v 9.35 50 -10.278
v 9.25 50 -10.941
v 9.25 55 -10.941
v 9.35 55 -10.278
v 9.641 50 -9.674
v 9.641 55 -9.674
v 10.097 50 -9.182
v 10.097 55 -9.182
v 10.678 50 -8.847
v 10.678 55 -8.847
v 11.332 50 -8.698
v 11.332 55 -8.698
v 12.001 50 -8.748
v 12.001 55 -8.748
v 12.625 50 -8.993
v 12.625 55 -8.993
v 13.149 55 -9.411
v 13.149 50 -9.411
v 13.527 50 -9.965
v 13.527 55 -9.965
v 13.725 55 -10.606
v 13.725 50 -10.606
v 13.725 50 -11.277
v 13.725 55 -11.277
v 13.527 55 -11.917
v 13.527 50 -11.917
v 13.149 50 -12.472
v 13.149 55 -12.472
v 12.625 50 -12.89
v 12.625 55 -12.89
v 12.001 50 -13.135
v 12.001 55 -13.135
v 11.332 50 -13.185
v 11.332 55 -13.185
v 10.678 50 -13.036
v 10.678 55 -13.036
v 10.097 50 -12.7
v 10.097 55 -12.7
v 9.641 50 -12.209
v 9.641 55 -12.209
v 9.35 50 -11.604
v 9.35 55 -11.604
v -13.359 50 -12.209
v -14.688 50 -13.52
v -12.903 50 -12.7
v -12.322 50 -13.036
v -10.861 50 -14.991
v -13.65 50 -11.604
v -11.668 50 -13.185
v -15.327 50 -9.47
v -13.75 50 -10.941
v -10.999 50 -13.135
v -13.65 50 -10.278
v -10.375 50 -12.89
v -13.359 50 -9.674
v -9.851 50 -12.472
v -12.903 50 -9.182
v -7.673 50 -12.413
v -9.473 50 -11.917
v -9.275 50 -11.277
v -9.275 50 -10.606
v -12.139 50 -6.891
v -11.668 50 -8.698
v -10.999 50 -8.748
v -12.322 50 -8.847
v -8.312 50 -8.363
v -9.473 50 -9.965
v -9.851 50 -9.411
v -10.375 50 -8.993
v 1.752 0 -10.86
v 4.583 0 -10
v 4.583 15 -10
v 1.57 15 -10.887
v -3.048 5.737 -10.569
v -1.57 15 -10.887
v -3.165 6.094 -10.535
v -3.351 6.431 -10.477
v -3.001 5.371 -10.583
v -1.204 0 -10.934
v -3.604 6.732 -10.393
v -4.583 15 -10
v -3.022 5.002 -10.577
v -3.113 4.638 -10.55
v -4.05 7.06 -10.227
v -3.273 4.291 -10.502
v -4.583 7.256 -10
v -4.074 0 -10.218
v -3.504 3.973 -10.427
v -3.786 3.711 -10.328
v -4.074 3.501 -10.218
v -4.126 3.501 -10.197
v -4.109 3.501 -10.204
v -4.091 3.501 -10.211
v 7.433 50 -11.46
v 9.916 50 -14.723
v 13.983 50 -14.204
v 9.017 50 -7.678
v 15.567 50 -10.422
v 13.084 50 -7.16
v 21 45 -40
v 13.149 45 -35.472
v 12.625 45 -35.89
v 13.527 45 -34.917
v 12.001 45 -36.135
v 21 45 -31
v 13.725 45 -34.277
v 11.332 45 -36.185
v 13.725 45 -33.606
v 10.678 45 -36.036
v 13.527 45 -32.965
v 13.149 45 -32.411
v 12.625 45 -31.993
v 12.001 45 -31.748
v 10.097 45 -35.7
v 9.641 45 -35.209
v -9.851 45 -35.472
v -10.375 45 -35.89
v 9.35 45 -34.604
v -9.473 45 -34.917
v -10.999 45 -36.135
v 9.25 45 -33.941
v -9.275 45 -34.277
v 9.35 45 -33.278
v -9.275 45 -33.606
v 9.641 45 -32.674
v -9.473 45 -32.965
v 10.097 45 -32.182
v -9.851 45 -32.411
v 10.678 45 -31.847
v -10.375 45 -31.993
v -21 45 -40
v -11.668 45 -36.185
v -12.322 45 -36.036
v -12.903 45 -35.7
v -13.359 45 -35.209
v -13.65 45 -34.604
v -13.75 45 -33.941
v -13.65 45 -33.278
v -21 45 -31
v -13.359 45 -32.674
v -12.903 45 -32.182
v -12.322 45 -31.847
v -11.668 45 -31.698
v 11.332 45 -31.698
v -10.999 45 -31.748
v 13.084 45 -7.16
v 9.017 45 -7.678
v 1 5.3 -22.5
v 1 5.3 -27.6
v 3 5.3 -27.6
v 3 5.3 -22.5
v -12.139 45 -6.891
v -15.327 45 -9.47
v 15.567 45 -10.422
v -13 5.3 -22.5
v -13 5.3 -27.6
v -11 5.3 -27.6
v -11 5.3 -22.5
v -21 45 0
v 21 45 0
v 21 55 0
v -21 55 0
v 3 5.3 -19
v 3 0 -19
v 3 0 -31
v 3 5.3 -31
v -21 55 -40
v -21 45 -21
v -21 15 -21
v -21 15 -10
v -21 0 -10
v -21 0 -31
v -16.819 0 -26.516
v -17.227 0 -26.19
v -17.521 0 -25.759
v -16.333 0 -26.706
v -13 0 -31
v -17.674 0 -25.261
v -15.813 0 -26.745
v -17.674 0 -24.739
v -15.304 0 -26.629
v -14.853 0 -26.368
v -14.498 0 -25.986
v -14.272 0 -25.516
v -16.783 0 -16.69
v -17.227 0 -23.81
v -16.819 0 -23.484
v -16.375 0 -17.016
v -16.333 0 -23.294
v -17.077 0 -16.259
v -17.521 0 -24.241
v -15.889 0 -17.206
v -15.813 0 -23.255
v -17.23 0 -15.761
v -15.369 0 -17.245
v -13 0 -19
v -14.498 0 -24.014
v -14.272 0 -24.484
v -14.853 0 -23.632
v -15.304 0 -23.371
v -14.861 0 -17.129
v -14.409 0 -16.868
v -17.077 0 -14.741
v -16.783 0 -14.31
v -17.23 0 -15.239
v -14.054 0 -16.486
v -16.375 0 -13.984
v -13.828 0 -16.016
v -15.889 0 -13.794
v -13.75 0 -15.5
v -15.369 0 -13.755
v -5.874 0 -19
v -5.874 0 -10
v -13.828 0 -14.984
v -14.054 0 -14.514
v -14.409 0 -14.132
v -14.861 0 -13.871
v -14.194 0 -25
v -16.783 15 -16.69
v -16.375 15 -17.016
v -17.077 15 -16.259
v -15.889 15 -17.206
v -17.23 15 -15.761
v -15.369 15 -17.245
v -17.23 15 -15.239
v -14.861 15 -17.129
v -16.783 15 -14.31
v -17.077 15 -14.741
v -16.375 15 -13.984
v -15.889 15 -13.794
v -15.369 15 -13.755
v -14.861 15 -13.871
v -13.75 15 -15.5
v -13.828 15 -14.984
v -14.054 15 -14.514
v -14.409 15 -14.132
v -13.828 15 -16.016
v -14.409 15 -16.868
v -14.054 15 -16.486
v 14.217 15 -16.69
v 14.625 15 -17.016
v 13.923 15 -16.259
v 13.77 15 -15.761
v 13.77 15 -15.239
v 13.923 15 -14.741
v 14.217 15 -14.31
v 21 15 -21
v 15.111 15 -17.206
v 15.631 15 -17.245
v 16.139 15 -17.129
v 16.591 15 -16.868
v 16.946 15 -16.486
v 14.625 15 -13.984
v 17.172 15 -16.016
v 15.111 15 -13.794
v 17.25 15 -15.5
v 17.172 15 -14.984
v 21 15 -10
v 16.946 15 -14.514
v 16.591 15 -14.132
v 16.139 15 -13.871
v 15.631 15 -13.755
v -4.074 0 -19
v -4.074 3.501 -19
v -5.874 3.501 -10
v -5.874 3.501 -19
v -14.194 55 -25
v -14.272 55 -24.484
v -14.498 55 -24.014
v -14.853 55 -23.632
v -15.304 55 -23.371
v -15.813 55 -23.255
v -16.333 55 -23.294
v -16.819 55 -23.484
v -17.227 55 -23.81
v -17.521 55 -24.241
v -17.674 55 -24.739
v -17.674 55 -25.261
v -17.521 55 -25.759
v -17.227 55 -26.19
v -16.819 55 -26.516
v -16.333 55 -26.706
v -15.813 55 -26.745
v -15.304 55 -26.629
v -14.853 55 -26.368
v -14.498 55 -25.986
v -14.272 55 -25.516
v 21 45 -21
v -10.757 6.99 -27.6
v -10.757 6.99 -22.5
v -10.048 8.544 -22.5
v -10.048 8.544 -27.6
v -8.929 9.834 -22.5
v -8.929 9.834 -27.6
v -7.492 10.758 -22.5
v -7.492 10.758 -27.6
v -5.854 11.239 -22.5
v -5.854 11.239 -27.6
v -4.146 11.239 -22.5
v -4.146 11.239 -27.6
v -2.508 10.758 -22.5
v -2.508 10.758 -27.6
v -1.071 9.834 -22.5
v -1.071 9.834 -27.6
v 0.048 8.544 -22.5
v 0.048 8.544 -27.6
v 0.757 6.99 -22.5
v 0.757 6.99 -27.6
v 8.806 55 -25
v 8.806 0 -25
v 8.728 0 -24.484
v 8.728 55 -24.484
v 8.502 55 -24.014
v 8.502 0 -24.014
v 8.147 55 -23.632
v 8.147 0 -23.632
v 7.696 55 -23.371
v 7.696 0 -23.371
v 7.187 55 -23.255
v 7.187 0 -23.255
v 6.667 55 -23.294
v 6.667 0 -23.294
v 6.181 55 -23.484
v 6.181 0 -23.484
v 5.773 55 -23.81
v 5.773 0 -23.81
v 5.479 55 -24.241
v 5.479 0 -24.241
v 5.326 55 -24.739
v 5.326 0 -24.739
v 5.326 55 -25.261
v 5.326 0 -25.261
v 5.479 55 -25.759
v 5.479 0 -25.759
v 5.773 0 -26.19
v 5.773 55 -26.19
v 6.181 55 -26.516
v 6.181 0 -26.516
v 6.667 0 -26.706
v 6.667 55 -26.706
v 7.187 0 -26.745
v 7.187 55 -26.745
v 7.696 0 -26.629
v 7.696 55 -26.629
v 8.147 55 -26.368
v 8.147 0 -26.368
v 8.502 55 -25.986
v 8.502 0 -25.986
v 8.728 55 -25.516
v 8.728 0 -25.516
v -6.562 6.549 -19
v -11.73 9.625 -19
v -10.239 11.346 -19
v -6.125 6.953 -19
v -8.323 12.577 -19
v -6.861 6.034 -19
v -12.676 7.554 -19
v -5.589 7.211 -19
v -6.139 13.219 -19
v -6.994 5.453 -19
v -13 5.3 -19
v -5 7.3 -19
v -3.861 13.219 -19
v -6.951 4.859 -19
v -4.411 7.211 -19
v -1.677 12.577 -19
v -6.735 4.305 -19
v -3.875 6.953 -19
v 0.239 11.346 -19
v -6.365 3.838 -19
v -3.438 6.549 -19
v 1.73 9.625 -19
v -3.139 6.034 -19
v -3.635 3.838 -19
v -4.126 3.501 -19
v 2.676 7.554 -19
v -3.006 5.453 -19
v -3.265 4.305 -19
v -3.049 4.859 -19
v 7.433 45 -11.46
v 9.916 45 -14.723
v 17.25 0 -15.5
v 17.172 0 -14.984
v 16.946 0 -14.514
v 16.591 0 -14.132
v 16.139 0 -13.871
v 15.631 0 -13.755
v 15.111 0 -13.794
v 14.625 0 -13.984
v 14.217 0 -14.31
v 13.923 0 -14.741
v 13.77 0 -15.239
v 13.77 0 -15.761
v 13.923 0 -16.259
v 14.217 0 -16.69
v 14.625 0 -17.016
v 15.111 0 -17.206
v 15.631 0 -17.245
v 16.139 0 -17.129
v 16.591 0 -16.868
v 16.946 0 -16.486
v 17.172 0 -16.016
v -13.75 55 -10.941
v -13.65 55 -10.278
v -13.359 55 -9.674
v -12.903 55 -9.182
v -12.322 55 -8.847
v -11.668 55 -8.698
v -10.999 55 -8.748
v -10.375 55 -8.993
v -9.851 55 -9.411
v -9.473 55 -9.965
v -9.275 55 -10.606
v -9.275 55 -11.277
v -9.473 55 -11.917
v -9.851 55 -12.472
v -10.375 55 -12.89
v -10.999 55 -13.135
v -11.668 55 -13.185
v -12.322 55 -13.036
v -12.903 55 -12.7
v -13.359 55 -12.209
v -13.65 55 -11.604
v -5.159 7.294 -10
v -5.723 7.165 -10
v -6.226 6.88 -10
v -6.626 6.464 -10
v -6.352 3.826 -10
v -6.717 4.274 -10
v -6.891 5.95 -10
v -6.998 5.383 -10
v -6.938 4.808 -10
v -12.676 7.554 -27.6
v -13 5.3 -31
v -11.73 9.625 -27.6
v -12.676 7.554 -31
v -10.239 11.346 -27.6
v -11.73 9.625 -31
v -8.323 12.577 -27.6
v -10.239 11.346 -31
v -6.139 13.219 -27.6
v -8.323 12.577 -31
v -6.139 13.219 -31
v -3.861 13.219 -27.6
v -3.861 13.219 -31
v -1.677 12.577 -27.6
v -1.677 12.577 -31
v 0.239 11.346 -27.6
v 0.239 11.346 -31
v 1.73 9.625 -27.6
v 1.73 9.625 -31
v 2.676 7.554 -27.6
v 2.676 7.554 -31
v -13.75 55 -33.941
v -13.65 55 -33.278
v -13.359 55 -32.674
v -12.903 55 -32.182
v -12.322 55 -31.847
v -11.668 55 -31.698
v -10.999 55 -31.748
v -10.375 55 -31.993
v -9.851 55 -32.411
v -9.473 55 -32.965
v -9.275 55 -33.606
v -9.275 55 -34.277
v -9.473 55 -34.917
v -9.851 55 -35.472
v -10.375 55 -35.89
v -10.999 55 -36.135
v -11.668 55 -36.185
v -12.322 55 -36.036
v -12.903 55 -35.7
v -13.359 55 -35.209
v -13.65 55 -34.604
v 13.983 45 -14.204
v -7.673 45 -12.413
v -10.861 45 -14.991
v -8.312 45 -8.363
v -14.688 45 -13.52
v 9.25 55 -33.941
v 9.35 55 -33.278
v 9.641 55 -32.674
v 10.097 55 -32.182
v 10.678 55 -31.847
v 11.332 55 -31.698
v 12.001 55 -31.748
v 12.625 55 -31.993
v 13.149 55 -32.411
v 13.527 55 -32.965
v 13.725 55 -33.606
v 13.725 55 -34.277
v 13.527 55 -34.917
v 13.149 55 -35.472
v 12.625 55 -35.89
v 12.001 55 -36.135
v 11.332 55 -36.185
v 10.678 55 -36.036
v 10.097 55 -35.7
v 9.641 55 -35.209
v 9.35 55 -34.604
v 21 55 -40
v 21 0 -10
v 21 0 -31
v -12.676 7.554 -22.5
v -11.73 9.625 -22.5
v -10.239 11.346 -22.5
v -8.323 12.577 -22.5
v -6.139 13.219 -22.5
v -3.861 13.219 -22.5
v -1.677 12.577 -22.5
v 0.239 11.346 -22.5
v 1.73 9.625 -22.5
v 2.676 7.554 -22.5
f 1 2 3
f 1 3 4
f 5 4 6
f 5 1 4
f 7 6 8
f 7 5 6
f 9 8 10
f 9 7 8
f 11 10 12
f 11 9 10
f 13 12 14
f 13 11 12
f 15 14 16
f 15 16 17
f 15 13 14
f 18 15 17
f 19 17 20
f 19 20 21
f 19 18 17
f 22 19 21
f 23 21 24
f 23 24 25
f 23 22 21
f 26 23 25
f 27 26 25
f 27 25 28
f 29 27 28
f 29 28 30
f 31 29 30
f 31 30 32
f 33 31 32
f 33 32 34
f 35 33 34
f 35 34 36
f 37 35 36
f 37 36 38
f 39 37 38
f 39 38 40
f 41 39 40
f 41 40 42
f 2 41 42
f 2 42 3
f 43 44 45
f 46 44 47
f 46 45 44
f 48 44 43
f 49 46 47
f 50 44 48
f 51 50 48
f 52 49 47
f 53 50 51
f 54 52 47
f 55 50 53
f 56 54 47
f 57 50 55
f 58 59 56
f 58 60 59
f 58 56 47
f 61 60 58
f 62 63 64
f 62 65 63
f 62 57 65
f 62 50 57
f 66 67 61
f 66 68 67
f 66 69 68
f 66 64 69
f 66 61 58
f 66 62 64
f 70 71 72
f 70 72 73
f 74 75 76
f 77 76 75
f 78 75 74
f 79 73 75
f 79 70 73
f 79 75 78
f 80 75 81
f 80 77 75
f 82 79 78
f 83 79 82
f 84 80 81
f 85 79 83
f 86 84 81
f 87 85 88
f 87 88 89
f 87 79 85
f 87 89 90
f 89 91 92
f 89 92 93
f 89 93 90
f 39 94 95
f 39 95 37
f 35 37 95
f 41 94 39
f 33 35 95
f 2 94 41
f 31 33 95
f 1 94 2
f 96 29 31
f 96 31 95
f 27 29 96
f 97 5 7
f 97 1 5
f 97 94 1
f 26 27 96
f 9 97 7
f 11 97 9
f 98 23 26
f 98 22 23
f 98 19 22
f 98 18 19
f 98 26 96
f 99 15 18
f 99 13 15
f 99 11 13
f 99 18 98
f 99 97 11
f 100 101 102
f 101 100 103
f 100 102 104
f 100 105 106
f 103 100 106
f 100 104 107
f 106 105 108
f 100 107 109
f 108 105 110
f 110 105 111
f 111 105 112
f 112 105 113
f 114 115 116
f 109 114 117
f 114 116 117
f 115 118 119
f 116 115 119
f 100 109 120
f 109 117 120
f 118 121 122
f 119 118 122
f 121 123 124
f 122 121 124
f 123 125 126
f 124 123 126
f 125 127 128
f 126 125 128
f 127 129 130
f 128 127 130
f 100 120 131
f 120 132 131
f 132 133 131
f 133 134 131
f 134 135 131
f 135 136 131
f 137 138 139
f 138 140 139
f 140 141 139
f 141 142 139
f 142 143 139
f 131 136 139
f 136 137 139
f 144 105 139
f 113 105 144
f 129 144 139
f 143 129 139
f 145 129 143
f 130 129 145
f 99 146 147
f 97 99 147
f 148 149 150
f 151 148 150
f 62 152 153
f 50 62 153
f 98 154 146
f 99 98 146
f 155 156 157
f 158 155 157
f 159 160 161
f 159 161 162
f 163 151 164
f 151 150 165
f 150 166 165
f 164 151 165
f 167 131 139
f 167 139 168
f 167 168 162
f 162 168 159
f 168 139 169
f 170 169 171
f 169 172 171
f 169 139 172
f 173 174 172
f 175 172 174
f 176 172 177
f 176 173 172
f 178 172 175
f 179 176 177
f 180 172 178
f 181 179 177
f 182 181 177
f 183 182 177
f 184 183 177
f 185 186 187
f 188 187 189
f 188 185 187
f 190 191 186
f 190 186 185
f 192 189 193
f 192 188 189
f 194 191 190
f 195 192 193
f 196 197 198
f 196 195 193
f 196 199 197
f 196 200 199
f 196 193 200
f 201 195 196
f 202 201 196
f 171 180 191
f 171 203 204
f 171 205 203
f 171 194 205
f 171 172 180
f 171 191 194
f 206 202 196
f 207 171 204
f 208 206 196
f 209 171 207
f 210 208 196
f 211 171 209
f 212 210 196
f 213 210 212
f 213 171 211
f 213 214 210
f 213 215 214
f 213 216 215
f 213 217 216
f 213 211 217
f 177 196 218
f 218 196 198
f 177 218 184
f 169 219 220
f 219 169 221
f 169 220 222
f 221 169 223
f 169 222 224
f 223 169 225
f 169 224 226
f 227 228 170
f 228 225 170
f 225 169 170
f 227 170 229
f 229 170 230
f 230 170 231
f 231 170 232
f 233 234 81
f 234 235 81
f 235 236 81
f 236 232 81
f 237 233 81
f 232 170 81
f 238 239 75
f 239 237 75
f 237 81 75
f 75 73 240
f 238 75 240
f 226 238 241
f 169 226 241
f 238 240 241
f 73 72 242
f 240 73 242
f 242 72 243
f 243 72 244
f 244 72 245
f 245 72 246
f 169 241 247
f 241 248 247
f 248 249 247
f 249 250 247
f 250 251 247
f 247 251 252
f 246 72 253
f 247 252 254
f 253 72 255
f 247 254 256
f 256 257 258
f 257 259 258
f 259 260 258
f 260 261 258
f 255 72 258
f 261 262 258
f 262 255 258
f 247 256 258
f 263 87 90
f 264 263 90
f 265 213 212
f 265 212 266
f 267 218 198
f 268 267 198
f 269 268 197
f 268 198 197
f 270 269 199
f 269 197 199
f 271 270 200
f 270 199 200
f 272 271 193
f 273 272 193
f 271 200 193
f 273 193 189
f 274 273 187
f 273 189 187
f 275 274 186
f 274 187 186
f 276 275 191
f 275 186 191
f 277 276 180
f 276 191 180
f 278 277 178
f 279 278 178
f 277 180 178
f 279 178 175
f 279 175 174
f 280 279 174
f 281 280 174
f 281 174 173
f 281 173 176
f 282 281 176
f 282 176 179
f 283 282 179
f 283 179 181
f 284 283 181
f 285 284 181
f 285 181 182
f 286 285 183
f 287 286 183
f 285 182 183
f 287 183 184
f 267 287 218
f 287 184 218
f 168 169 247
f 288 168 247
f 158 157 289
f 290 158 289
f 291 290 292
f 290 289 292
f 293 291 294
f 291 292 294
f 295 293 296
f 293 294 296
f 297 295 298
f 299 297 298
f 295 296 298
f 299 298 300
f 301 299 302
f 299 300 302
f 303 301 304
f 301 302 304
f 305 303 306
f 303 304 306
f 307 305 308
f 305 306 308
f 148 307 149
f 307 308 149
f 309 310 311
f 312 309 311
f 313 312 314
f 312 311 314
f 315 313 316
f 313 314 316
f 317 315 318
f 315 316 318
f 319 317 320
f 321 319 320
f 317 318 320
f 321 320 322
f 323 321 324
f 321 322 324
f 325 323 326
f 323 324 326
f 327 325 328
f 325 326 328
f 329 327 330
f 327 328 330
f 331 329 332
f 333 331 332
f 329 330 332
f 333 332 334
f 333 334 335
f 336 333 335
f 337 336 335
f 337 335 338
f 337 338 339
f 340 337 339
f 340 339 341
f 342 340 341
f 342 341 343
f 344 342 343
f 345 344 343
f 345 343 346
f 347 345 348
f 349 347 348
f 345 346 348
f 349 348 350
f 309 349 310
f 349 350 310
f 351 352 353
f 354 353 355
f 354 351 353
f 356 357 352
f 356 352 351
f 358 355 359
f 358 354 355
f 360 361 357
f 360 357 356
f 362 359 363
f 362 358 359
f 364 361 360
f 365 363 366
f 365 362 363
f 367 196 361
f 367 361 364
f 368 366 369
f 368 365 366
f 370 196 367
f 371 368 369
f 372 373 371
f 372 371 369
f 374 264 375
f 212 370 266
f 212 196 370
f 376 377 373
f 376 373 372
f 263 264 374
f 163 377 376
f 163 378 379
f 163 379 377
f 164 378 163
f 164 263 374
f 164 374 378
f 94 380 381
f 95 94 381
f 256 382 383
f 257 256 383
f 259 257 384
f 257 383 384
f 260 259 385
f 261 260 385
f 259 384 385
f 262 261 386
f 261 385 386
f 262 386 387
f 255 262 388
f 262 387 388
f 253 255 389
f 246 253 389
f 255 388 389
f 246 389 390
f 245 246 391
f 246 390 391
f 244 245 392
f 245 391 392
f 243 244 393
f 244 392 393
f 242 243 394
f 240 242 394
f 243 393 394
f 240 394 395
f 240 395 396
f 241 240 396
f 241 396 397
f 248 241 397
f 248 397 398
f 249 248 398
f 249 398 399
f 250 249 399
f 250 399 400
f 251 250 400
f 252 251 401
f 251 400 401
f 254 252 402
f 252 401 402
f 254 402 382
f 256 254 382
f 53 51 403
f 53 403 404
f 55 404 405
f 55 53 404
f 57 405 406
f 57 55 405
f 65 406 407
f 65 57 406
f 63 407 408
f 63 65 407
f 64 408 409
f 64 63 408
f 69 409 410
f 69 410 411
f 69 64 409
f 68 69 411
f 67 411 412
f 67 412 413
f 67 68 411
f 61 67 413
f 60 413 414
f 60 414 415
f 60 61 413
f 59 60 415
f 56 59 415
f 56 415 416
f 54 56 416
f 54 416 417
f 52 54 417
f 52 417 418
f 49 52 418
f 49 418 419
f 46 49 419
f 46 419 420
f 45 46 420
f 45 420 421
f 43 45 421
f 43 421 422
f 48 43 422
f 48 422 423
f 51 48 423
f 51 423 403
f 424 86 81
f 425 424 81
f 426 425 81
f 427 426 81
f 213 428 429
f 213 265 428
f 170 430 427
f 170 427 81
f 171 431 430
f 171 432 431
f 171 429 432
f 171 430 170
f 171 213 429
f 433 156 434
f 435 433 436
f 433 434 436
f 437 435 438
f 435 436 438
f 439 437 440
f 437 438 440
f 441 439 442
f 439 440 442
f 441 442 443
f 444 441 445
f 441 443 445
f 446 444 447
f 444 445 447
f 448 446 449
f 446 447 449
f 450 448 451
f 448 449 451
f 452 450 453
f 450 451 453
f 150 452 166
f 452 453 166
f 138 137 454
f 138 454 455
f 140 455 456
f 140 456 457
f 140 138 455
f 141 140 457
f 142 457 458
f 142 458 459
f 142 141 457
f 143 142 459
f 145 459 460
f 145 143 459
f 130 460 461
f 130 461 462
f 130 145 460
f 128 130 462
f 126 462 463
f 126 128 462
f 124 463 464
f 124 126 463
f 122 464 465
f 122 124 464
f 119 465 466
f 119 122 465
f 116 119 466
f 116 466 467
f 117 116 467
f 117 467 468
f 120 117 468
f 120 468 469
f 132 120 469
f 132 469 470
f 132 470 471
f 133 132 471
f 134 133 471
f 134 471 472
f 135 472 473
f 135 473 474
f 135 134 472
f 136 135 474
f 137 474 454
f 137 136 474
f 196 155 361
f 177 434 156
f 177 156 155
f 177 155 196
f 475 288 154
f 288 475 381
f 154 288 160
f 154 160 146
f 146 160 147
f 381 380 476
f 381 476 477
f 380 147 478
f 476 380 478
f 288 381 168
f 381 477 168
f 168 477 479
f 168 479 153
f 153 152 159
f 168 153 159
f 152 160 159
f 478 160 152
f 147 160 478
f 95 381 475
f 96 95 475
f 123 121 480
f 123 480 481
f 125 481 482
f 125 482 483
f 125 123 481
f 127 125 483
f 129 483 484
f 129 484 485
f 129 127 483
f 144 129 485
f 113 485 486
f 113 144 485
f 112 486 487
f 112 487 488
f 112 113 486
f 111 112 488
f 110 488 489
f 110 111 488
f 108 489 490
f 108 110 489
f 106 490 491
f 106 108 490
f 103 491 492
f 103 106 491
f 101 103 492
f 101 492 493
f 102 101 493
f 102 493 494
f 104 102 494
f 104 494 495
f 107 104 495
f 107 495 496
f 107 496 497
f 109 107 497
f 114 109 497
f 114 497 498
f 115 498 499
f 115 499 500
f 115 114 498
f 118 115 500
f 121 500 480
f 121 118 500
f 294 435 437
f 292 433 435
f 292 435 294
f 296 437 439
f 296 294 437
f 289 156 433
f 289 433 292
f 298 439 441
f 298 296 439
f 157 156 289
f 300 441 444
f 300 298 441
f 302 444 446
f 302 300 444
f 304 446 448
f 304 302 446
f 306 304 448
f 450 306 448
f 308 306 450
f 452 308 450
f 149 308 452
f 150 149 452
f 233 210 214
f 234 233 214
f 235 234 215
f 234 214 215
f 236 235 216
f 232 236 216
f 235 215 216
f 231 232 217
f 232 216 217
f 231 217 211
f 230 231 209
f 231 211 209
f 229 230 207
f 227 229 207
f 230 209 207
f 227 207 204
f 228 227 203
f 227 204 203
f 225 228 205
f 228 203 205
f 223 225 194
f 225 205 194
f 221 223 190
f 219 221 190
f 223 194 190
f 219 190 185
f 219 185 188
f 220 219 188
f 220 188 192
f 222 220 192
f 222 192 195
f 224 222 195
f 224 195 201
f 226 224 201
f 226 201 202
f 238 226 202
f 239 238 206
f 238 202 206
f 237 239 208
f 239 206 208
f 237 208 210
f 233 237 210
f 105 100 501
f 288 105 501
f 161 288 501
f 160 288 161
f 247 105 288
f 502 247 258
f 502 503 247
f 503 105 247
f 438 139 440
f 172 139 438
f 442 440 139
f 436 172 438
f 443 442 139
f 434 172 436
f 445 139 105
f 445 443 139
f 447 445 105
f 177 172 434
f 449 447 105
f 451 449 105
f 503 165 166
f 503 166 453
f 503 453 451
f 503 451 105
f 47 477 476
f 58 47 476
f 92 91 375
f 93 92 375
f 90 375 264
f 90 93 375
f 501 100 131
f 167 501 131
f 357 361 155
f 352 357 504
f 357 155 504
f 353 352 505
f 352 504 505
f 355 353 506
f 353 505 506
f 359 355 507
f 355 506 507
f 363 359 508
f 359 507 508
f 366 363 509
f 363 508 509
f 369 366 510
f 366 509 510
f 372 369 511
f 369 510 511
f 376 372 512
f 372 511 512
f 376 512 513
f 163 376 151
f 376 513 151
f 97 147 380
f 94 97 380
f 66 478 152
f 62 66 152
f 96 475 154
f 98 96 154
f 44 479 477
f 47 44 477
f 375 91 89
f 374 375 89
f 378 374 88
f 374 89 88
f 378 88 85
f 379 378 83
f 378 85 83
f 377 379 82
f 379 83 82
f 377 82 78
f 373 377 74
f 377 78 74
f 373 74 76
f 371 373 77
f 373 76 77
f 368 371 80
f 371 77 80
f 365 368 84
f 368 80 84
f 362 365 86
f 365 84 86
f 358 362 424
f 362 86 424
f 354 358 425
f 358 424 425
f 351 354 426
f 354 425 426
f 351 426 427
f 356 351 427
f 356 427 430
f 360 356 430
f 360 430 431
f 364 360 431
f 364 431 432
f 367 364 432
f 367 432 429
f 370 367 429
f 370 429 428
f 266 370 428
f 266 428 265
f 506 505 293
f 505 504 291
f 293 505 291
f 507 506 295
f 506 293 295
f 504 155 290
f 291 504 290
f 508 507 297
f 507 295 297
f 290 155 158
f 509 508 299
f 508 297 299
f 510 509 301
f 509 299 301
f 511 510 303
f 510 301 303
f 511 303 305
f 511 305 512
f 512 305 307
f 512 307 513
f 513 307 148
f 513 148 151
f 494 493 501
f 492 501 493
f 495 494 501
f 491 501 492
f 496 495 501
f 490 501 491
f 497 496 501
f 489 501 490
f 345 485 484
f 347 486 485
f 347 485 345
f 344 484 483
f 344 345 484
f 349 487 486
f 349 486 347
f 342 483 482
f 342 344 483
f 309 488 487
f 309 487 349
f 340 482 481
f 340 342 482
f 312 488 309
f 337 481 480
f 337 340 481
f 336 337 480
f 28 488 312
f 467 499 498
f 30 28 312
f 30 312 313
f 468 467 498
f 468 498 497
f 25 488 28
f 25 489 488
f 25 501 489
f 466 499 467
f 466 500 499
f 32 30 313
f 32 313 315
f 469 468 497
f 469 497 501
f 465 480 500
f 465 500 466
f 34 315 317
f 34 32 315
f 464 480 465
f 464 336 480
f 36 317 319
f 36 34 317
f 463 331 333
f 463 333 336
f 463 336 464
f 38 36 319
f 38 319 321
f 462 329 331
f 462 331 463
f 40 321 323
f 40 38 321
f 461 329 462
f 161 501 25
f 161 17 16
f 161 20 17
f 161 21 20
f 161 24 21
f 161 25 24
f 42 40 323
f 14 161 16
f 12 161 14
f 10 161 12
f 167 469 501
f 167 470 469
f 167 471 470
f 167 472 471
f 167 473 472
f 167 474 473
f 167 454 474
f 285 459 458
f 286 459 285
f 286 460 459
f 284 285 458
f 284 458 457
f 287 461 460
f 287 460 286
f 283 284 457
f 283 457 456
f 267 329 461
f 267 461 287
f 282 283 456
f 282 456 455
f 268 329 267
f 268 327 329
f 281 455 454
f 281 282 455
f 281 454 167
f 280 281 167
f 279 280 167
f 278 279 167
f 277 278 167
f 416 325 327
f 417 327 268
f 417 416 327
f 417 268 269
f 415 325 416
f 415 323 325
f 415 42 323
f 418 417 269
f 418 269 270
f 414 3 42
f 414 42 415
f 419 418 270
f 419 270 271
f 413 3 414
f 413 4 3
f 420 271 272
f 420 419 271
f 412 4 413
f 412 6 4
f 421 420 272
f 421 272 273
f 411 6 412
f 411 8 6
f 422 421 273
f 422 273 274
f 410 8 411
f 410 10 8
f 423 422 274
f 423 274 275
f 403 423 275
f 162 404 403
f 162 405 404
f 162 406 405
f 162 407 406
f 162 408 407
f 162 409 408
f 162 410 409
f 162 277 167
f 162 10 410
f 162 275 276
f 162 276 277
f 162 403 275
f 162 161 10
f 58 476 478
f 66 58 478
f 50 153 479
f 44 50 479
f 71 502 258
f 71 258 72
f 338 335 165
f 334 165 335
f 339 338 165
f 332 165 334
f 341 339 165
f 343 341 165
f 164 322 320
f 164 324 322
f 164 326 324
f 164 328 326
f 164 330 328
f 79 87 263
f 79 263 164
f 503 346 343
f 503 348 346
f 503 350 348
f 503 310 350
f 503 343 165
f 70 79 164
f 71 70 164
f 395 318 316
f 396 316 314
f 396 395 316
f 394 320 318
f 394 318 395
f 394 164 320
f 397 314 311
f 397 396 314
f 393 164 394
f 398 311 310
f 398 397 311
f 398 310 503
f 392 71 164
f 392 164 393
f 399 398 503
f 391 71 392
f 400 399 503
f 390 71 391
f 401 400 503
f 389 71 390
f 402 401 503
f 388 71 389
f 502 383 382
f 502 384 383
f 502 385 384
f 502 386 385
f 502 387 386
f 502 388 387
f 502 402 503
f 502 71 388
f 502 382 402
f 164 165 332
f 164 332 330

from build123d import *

# Parameters (mm, degrees)
F0_R      = 1.75
F1_DEPTH  = 15
F2_W      = 42
F2_H      = 30
F2_H_2    = 45
F3_DEPTH  = 10
F4_W      = 42
F4_H      = 40
F4_R      = 2.25
F5_DEPTH  = 10
F6_R      = 2
F7_DEPTH  = 25
F8_R      = 2
F9_DEPTH  = 12
F11_DEPTH = 8.5
F12_R     = 6
F13_DEPTH = 9
F14_R     = 8
F15_DEPTH = 3.4
F16_W     = 16
F16_H     = 8.6135048579
F17_DEPTH = 12
F18_R     = 1.75
F19_DEPTH = 55
F21_DEPTH = 5
F22_W     = 1.8
F22_H     = 3.5010978645
F23_DEPTH = 25


with BuildPart() as f1:
    # F0 (on Front) → F1 (new body)
    with BuildSketch(Plane.XZ):
        with BuildLine():
            Line((-21, -21), (21, -21))
            Line((21, -21), (21, -10))
            Line((21, -10), (4.582575695, -10))
            ThreePointArc((4.582575695, -10), (0, -11), (-4.582575695, -10))
            Line((-4.582575695, -10), (-21, -10))
            Line((-21, -10), (-21, -21))
        make_face()
        with Locations((-15.5, -15.5)):
            Circle(F0_R, mode=Mode.SUBTRACT)
        with Locations((15.5, -15.5)):
            Circle(F0_R, mode=Mode.SUBTRACT)
    extrude(amount=-F1_DEPTH)

    # F2 (on face) → F3 (join)
    with BuildSketch(Plane(origin=(0, 0, -21), x_dir=(1, 0, 0), z_dir=(0, 0, -1))):
        with Locations((0, -30)):
            Rectangle(F2_W, F2_H)
        with Locations((0, -22.5)):
            Rectangle(F2_W, F2_H_2)
    extrude(amount=F3_DEPTH)

    # F4 (on face) → F5 (join)
    with BuildSketch(Plane(origin=(0, 45, 0), x_dir=(-1, 0, 0), z_dir=(0, 1, 0))):
        with Locations((0, -20)):
            Rectangle(F4_W, F4_H)
        with Locations((-11.5, -33.9412614703)):
            Circle(F4_R, mode=Mode.SUBTRACT)
        with Locations((11.5, -33.9412614703)):
            Circle(F4_R, mode=Mode.SUBTRACT)
        with Locations((-11.5, -10.9412614703)):
            Circle(F4_R, mode=Mode.SUBTRACT)
        with Locations((11.5, -10.9412614703)):
            Circle(F4_R, mode=Mode.SUBTRACT)
    extrude(amount=F5_DEPTH)

    # F6 (on face) → F7 (cut)
    with BuildSketch(Plane.XY.offset(-10)):
        with Locations((-5, 5.3)):
            Circle(F6_R)
    extrude(amount=-F7_DEPTH, mode=Mode.SUBTRACT)

    # F8 (on face) → F9 (cut)
    with BuildSketch(Plane(origin=(0, 0, -31), x_dir=(1, 0, 0), z_dir=(0, 0, -1))):
        with BuildLine():
            ThreePointArc((-10.9924953066, 0), (-7.8337287756, -12.781308791), (3, -5.3))
            ThreePointArc((3, -5.3), (2.481308791, -2.4662712244), (0.9924953066, 0))
            Line((0.9924953066, 0), (-10.9924953066, 0))
        make_face()
        with Locations((-5, -5.3)):
            Circle(F8_R, mode=Mode.SUBTRACT)
    extrude(amount=-F9_DEPTH, mode=Mode.SUBTRACT)

    # F10 (on face) → F11 (join)
    with BuildSketch(Plane(origin=(0, 0, -31), x_dir=(1, 0, 0), z_dir=(0, 0, -1))):
        with BuildLine():
            ThreePointArc((-10.9924953066, 0), (-7.8337287756, -12.781308791), (3, -5.3))
            ThreePointArc((3, -5.3), (2.481308791, -2.4662712244), (0.9924953066, 0))
            ThreePointArc((0.9924953066, 0), (-5, 2.7), (-10.9924953066, 0))
        make_face()
    extrude(amount=-F11_DEPTH)

    # F12 (on face) → F13 (cut)
    with BuildSketch(Plane(origin=(0, 0, -31), x_dir=(1, 0, 0), z_dir=(0, 0, -1))):
        with Locations((-5, -5.3)):
            Circle(F12_R)
    extrude(amount=-F13_DEPTH, mode=Mode.SUBTRACT)

    # F14 (on face) → F15 (cut)
    with BuildSketch(Plane(origin=(0, 0, -31), x_dir=(1, 0, 0), z_dir=(0, 0, -1))):
        with Locations((-5, -5.3)):
            Circle(F14_R)
    extrude(amount=-F15_DEPTH, mode=Mode.SUBTRACT)

    # F16 (on face) → F17 (cut)
    with BuildSketch(Plane(origin=(0, 0, -31), x_dir=(1, 0, 0), z_dir=(0, 0, -1))):
        with Locations((-5, -0.993247571)):
            Rectangle(F16_W, F16_H)
    extrude(amount=-F17_DEPTH, mode=Mode.SUBTRACT)

    # F18 (on face) → F19 (cut)
    with BuildSketch(Plane.XZ):
        with Locations((-15.9438401461, -25)):
            Circle(F18_R)
        with Locations((7.0561598539, -25)):
            Circle(F18_R)
    extrude(amount=-F19_DEPTH, mode=Mode.SUBTRACT)

    # F20 (on face) → F21 (cut)
    with BuildSketch(Plane.XZ.offset(-45)):
        Polygon((-10.8610754958, -14.9911720222), (-7.673212327, -12.4128918945), (-8.3121368311, -8.3629813427), (-12.1389245042, -6.8913509185), (-15.326787673, -9.4696310461), (-14.6878631689, -13.519541598), align=None)
        Polygon((9.9157388399, -14.7228109644), (13.9827873475, -14.2040466283), (15.5670485076, -10.4224971341), (13.0842611601, -7.1597119762), (9.0172126525, -7.6784763124), (7.4329514924, -11.4600258065), align=None)
    extrude(amount=-F21_DEPTH, mode=Mode.SUBTRACT)

    # F22 (on face) → F23 (cut)
    with BuildSketch(Plane.XY.offset(-10)):
        with Locations((-4.9740429662, 1.7505489322)):
            Rectangle(F22_W, F22_H)
    extrude(amount=-F23_DEPTH, mode=Mode.SUBTRACT)


solid = f1.part
